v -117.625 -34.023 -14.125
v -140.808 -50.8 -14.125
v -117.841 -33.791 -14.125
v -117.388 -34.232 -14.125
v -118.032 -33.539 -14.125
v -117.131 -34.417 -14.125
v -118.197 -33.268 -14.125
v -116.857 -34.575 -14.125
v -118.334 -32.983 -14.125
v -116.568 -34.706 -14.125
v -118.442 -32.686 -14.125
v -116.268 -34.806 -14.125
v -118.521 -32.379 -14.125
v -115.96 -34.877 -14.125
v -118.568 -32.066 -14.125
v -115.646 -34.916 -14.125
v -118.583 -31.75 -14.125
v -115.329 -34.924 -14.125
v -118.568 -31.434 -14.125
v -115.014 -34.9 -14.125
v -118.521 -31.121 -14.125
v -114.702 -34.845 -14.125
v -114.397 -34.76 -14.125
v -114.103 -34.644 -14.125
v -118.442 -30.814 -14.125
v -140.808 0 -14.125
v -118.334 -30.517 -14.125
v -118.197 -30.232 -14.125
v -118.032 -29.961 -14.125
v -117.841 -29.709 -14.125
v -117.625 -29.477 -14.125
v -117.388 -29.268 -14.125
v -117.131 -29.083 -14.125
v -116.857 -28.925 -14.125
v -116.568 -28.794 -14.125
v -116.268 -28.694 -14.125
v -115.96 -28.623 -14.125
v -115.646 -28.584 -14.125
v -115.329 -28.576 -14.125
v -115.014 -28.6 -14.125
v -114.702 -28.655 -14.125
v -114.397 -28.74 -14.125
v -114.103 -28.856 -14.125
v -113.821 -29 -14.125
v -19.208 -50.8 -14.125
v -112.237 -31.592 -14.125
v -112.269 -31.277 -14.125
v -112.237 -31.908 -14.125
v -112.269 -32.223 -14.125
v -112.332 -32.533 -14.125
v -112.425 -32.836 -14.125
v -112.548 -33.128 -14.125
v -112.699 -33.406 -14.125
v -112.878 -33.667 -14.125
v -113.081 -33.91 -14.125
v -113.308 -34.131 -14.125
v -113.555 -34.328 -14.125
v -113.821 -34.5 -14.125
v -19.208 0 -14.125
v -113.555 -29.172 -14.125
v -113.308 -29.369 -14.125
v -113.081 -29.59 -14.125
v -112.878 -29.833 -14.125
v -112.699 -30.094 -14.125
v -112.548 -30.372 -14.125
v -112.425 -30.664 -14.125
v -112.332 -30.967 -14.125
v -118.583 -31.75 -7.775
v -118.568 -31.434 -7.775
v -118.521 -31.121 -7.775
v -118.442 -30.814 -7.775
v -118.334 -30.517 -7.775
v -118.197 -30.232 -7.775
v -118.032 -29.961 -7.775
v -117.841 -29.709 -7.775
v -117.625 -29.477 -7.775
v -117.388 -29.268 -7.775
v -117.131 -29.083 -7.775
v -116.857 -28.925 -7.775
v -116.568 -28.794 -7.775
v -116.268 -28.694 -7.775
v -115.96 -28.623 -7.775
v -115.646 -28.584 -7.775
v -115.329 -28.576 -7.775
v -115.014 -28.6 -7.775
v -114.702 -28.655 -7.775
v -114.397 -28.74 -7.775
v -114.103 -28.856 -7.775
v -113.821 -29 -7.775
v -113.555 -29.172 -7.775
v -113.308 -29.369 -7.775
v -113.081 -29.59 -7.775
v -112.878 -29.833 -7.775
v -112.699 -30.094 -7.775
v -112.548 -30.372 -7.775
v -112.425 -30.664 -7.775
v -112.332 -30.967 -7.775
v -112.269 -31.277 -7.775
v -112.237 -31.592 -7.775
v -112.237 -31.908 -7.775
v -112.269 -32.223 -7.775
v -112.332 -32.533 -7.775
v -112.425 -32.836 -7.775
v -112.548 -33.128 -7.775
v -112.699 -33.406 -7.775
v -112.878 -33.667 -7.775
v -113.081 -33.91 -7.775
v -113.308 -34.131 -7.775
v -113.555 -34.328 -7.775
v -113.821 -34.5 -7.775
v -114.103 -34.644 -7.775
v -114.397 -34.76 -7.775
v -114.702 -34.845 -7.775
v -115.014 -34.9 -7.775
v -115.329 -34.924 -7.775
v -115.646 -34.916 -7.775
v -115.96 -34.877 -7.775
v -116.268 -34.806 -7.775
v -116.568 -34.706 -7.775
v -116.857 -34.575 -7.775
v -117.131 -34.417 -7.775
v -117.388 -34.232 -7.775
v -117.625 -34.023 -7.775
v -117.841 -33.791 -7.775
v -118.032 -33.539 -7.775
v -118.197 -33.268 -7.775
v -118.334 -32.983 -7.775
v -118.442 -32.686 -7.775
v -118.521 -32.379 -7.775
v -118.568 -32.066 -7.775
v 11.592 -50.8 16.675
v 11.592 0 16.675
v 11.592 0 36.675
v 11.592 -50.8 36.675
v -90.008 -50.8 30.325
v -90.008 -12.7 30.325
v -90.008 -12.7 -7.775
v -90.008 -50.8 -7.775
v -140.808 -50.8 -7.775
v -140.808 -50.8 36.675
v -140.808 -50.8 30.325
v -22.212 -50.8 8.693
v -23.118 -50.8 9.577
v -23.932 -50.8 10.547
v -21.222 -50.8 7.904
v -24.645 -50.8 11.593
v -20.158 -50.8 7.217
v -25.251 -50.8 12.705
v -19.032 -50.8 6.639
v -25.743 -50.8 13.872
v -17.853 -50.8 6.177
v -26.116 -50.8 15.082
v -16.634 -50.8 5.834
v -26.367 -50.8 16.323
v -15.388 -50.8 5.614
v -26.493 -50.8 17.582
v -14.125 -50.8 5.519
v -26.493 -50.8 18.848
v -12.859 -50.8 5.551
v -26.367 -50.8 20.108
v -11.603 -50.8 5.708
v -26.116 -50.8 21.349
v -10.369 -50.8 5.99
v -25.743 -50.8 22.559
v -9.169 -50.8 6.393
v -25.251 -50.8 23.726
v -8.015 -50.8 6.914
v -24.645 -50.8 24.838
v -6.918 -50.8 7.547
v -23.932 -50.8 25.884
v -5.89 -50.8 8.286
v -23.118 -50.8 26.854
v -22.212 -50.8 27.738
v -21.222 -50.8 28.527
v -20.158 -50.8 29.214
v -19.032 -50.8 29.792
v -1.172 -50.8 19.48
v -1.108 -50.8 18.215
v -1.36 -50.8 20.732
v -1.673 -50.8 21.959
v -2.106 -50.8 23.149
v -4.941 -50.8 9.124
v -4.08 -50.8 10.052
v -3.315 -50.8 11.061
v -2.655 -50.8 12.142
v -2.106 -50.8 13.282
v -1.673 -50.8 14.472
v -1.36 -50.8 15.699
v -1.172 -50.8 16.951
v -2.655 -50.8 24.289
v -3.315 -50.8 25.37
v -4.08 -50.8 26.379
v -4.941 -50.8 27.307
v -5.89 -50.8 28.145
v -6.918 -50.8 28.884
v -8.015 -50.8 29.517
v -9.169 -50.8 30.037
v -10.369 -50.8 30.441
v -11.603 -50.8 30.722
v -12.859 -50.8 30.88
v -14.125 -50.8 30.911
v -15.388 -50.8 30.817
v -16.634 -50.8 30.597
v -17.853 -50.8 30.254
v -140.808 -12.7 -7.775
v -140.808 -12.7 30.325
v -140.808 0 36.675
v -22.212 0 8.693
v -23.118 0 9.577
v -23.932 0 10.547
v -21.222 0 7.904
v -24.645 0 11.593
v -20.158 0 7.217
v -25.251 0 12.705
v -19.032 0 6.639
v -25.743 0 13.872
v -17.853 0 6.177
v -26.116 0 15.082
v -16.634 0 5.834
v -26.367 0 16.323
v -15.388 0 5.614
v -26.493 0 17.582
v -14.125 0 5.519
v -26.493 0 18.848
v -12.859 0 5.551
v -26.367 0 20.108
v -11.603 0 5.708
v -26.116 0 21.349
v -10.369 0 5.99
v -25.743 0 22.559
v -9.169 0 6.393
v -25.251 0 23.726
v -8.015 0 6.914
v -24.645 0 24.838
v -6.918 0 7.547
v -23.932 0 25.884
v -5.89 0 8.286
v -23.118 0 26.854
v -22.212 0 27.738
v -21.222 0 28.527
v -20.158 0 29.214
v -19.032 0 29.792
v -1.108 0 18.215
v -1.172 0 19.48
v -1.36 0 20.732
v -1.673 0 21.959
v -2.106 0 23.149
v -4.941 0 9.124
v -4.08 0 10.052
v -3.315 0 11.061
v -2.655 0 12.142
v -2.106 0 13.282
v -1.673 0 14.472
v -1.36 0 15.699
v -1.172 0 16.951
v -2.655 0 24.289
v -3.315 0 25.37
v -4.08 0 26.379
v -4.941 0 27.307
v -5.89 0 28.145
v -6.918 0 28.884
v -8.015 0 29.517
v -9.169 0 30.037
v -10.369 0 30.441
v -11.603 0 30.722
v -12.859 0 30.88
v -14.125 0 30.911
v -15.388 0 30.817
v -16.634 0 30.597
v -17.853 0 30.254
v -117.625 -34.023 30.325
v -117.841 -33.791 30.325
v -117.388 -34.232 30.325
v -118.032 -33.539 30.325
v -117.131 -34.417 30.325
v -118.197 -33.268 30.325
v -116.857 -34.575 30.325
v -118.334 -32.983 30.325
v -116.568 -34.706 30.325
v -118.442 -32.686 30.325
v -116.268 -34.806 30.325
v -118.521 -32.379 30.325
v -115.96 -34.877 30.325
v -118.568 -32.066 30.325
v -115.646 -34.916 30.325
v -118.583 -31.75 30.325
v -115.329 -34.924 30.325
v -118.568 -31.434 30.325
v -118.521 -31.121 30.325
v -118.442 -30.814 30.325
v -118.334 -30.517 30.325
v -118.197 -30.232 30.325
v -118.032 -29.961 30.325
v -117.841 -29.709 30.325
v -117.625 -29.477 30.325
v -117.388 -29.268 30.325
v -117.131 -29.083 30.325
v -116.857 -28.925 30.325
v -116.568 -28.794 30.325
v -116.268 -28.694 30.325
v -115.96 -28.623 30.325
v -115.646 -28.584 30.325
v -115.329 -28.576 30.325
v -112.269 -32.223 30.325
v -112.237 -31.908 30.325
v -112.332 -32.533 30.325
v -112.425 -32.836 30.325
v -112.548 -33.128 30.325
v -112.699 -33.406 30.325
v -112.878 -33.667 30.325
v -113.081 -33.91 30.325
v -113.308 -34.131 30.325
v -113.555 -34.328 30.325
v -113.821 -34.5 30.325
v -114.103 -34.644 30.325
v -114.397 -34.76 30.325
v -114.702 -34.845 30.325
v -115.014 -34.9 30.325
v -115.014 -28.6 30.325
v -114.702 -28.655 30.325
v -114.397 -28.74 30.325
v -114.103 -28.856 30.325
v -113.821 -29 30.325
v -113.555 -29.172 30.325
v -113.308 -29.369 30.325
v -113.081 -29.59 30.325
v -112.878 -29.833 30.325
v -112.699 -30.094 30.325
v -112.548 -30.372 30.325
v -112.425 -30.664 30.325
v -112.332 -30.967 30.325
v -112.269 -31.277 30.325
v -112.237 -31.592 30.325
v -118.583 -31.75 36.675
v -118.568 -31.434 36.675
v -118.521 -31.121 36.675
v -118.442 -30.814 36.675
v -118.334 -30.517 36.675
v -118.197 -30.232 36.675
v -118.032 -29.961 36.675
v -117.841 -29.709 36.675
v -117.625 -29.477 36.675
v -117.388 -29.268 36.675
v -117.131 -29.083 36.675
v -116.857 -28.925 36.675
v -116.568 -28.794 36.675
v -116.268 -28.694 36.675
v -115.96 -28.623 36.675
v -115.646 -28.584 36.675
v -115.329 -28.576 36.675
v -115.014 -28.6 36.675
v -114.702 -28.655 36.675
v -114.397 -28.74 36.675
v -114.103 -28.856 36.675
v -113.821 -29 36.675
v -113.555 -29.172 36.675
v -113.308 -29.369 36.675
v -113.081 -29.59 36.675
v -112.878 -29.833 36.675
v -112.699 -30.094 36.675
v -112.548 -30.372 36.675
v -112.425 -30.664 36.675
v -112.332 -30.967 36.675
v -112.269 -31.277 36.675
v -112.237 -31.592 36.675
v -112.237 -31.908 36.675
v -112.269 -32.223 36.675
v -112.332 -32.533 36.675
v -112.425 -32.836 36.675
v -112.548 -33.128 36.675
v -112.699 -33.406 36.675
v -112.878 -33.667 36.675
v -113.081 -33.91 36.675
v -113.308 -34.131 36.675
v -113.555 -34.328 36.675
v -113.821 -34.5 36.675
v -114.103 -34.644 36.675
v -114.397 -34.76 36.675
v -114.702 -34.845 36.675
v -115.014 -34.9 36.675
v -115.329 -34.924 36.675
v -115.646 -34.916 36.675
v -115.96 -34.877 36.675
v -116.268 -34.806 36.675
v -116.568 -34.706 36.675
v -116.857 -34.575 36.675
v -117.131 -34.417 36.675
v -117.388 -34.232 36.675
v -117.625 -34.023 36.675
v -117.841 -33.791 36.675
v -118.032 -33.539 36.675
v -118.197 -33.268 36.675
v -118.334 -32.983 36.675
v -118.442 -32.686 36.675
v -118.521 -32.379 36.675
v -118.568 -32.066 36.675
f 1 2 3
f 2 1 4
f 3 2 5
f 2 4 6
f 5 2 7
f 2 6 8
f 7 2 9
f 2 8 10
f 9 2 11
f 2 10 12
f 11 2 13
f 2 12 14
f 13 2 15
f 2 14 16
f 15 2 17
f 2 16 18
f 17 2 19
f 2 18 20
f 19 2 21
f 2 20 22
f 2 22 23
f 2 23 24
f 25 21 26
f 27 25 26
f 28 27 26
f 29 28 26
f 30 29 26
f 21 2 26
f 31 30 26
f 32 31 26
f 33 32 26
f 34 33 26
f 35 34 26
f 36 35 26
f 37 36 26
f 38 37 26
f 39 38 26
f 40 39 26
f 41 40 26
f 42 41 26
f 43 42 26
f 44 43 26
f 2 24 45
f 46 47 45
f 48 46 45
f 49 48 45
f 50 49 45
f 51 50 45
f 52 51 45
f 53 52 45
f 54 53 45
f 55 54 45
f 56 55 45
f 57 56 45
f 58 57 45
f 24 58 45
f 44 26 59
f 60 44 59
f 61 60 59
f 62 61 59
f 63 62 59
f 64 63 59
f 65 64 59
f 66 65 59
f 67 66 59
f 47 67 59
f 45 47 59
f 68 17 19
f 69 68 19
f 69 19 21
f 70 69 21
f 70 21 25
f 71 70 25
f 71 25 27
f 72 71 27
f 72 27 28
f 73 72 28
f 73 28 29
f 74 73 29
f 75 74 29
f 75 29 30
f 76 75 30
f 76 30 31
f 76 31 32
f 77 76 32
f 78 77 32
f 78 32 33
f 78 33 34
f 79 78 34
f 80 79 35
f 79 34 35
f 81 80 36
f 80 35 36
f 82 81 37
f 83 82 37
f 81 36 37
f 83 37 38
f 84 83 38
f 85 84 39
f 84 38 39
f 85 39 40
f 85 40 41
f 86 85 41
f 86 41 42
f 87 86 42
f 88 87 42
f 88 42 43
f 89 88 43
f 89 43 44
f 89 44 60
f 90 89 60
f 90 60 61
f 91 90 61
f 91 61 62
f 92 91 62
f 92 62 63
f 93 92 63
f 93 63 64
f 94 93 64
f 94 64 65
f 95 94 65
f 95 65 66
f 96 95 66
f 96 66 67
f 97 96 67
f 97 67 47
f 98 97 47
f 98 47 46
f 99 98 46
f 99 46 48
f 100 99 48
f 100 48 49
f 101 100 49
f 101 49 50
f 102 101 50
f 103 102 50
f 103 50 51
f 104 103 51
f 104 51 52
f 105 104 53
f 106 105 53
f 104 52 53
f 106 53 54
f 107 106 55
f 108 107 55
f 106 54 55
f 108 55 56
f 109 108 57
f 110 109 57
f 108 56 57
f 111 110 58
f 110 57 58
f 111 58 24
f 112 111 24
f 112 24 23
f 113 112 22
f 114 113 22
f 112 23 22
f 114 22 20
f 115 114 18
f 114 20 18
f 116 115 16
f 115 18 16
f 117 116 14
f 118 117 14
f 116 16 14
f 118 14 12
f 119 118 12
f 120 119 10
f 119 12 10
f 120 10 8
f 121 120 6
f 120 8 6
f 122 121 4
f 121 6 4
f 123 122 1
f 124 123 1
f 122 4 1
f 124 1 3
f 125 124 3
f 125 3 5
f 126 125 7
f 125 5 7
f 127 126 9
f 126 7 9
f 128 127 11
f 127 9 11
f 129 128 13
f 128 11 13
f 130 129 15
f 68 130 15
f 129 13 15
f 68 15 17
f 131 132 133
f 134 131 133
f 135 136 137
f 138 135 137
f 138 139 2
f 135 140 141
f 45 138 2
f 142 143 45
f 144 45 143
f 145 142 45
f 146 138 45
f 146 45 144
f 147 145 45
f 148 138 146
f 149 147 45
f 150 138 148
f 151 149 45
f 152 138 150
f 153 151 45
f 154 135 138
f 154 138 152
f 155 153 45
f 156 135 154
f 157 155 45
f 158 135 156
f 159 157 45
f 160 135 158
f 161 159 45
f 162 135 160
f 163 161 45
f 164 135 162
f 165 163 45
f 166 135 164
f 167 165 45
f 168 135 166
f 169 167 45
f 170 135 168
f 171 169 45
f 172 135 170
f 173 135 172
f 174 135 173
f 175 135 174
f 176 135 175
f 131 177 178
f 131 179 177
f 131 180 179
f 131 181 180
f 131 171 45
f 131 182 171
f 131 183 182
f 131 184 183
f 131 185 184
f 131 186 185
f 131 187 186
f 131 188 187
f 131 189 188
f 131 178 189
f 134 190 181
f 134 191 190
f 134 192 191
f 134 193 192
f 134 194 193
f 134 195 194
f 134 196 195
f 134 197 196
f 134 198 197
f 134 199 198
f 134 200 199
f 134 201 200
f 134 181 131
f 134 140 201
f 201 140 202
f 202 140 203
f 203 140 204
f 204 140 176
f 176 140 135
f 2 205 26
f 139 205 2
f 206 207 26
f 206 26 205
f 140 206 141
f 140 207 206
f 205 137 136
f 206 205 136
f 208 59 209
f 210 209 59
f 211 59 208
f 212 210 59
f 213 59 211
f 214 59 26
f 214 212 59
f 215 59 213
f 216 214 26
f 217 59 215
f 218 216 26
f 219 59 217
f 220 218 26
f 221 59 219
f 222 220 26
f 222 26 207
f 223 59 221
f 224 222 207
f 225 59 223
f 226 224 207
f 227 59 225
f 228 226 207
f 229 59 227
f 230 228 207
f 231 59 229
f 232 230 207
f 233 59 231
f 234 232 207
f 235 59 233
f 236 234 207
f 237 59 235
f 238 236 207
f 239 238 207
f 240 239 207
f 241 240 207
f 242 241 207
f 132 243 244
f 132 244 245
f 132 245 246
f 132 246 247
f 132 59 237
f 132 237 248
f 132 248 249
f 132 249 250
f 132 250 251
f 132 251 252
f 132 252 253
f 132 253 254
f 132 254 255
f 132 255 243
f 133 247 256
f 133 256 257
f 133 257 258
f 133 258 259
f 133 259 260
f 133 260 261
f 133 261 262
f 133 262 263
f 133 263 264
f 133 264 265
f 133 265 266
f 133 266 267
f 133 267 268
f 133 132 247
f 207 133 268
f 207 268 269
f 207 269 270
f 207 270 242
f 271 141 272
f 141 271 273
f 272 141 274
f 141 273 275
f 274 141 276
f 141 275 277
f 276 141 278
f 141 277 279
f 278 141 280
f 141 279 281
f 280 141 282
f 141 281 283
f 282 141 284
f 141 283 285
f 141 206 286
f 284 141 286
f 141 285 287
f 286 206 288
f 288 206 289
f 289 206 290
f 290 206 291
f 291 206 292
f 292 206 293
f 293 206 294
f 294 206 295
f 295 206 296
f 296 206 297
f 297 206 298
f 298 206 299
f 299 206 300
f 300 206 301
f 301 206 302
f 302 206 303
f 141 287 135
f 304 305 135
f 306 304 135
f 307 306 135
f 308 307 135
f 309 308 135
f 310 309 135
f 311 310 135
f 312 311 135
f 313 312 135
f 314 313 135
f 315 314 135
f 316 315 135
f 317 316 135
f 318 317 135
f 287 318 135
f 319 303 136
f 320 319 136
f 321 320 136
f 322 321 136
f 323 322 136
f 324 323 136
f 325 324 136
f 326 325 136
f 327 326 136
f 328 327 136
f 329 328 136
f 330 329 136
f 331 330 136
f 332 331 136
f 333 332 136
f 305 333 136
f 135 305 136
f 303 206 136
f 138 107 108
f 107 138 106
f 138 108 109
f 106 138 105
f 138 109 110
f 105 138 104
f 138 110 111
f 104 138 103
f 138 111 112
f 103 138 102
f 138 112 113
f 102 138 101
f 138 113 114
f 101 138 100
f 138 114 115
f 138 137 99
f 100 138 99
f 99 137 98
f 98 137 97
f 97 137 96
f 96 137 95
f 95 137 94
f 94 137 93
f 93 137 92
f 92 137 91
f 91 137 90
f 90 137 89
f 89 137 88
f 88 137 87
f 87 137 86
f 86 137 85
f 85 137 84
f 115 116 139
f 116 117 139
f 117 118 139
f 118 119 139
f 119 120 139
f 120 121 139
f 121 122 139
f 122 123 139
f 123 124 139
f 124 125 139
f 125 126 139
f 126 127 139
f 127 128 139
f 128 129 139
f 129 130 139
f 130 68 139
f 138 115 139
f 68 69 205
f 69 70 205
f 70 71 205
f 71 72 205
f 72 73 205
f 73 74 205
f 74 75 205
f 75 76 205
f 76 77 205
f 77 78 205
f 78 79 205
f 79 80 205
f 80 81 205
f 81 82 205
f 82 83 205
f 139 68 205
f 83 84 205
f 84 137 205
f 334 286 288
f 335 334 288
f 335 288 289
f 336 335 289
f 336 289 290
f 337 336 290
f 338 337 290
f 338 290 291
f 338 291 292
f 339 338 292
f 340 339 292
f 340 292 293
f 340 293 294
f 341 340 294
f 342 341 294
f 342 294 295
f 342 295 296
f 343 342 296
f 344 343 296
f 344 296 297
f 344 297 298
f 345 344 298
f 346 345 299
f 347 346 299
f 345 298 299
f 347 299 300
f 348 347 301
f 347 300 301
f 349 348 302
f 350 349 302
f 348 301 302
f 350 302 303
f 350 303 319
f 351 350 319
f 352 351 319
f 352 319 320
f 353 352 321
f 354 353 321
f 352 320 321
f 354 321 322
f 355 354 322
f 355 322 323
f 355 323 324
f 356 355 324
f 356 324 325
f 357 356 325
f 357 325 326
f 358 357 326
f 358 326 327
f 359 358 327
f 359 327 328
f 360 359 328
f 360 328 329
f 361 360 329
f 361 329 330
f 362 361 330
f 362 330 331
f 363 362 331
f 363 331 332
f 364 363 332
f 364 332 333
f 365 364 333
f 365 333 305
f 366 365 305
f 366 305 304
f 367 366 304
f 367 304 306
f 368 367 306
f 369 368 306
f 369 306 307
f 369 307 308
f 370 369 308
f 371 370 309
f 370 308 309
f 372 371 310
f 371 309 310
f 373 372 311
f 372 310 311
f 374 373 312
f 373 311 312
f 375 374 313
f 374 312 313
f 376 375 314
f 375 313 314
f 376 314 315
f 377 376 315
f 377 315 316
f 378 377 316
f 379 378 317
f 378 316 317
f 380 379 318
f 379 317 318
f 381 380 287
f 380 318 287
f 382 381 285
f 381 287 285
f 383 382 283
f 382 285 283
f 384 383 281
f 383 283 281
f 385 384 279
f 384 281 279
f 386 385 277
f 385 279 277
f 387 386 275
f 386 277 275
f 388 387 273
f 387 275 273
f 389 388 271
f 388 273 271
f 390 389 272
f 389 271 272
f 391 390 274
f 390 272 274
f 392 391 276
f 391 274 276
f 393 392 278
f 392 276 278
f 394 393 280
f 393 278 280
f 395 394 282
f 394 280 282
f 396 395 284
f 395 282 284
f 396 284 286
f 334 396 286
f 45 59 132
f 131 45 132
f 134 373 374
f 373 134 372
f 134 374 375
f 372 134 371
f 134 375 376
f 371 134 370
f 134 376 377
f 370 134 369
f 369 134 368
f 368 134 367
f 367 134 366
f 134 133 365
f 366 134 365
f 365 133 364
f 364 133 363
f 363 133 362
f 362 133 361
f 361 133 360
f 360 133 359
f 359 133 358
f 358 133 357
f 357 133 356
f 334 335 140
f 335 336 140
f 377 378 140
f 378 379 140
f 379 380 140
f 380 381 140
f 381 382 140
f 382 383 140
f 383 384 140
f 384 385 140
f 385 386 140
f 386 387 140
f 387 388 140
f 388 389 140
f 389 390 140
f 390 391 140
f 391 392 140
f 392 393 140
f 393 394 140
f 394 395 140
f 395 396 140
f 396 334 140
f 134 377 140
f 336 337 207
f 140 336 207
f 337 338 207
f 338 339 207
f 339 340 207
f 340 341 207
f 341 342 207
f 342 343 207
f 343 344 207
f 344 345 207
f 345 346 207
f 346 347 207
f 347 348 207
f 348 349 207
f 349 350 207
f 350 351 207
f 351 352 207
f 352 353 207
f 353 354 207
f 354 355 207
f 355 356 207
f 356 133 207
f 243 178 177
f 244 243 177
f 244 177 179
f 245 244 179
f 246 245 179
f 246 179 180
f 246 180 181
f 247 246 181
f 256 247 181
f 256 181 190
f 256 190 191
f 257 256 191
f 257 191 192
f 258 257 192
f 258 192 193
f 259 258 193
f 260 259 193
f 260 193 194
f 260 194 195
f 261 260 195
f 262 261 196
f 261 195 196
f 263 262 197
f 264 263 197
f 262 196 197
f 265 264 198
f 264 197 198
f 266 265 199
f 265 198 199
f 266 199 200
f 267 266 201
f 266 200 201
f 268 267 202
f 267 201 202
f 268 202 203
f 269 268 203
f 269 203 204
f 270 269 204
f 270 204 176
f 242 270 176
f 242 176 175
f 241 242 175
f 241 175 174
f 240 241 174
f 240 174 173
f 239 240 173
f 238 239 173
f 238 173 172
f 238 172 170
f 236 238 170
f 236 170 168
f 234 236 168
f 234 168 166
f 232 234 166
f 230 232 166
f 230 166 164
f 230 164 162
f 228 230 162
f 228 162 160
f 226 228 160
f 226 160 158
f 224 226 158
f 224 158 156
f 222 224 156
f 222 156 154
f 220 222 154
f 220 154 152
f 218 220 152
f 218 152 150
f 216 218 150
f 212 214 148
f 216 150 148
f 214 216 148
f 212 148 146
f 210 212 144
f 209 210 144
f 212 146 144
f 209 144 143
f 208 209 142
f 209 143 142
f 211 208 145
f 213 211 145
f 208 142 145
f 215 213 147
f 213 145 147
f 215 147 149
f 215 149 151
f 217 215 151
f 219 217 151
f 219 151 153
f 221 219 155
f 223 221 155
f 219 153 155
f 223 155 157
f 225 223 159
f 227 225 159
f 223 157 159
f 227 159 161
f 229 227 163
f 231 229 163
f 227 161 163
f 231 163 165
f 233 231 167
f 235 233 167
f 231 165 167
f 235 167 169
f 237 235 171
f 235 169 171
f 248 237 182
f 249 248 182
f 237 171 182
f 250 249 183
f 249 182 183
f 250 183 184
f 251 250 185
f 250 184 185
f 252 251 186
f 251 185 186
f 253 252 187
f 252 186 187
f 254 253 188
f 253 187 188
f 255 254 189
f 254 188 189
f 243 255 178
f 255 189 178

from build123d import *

# Parameters (mm, degrees)
F1_DEPTH = 50.8
F2_W     = 12.7
F2_H     = 38.1
F3_DEPTH = 50.8
F5_D     = 25.4
F7_D     = 6.35


# Not quite as in the source:
# - a feature names something its author has since deleted; it is built from what else it names


with BuildPart() as f1:
    # F0 (on Front) → F1 (new body)
    with BuildSketch(Plane.XZ):
        Polygon((-140.8084735786, 36.6746302678), (-140.8084735786, 30.3246302678), (-90.0084735786, 30.3246302678), (-90.0084735786, -7.7753697322), (-140.8084735786, -7.7753697322), (-140.8084735786, -14.1253697322), (-19.2084735786, -14.1253697322), (11.5915264214, 16.6746302678), (11.5915264214, 36.6746302678), align=None)
    extrude(amount=F1_DEPTH)

    # F2 (on face) → F3 (join)
    with BuildSketch(Plane(origin=(-90.0084735786, 0, 0), x_dir=(0, -1, 0), z_dir=(-1, 0, 0))):
        with Locations((6.35, 11.2746302678)):
            Rectangle(F2_W, F2_H)
    extrude(amount=F3_DEPTH)

    # F5 (through all)
    with Locations(Plane(origin=(0, 0, 0), x_dir=(-1, 0, 0), z_dir=(0, 1, 0))):
        with Locations((13.8084735786, 18.215398631)):
            Hole(F5_D / 2)

    # F7 (through all)
    with Locations(Plane.XY.offset(36.6746302678)):
        with Locations((-115.4084735786, -31.75)):
            Hole(F7_D / 2)


solid = f1.part
